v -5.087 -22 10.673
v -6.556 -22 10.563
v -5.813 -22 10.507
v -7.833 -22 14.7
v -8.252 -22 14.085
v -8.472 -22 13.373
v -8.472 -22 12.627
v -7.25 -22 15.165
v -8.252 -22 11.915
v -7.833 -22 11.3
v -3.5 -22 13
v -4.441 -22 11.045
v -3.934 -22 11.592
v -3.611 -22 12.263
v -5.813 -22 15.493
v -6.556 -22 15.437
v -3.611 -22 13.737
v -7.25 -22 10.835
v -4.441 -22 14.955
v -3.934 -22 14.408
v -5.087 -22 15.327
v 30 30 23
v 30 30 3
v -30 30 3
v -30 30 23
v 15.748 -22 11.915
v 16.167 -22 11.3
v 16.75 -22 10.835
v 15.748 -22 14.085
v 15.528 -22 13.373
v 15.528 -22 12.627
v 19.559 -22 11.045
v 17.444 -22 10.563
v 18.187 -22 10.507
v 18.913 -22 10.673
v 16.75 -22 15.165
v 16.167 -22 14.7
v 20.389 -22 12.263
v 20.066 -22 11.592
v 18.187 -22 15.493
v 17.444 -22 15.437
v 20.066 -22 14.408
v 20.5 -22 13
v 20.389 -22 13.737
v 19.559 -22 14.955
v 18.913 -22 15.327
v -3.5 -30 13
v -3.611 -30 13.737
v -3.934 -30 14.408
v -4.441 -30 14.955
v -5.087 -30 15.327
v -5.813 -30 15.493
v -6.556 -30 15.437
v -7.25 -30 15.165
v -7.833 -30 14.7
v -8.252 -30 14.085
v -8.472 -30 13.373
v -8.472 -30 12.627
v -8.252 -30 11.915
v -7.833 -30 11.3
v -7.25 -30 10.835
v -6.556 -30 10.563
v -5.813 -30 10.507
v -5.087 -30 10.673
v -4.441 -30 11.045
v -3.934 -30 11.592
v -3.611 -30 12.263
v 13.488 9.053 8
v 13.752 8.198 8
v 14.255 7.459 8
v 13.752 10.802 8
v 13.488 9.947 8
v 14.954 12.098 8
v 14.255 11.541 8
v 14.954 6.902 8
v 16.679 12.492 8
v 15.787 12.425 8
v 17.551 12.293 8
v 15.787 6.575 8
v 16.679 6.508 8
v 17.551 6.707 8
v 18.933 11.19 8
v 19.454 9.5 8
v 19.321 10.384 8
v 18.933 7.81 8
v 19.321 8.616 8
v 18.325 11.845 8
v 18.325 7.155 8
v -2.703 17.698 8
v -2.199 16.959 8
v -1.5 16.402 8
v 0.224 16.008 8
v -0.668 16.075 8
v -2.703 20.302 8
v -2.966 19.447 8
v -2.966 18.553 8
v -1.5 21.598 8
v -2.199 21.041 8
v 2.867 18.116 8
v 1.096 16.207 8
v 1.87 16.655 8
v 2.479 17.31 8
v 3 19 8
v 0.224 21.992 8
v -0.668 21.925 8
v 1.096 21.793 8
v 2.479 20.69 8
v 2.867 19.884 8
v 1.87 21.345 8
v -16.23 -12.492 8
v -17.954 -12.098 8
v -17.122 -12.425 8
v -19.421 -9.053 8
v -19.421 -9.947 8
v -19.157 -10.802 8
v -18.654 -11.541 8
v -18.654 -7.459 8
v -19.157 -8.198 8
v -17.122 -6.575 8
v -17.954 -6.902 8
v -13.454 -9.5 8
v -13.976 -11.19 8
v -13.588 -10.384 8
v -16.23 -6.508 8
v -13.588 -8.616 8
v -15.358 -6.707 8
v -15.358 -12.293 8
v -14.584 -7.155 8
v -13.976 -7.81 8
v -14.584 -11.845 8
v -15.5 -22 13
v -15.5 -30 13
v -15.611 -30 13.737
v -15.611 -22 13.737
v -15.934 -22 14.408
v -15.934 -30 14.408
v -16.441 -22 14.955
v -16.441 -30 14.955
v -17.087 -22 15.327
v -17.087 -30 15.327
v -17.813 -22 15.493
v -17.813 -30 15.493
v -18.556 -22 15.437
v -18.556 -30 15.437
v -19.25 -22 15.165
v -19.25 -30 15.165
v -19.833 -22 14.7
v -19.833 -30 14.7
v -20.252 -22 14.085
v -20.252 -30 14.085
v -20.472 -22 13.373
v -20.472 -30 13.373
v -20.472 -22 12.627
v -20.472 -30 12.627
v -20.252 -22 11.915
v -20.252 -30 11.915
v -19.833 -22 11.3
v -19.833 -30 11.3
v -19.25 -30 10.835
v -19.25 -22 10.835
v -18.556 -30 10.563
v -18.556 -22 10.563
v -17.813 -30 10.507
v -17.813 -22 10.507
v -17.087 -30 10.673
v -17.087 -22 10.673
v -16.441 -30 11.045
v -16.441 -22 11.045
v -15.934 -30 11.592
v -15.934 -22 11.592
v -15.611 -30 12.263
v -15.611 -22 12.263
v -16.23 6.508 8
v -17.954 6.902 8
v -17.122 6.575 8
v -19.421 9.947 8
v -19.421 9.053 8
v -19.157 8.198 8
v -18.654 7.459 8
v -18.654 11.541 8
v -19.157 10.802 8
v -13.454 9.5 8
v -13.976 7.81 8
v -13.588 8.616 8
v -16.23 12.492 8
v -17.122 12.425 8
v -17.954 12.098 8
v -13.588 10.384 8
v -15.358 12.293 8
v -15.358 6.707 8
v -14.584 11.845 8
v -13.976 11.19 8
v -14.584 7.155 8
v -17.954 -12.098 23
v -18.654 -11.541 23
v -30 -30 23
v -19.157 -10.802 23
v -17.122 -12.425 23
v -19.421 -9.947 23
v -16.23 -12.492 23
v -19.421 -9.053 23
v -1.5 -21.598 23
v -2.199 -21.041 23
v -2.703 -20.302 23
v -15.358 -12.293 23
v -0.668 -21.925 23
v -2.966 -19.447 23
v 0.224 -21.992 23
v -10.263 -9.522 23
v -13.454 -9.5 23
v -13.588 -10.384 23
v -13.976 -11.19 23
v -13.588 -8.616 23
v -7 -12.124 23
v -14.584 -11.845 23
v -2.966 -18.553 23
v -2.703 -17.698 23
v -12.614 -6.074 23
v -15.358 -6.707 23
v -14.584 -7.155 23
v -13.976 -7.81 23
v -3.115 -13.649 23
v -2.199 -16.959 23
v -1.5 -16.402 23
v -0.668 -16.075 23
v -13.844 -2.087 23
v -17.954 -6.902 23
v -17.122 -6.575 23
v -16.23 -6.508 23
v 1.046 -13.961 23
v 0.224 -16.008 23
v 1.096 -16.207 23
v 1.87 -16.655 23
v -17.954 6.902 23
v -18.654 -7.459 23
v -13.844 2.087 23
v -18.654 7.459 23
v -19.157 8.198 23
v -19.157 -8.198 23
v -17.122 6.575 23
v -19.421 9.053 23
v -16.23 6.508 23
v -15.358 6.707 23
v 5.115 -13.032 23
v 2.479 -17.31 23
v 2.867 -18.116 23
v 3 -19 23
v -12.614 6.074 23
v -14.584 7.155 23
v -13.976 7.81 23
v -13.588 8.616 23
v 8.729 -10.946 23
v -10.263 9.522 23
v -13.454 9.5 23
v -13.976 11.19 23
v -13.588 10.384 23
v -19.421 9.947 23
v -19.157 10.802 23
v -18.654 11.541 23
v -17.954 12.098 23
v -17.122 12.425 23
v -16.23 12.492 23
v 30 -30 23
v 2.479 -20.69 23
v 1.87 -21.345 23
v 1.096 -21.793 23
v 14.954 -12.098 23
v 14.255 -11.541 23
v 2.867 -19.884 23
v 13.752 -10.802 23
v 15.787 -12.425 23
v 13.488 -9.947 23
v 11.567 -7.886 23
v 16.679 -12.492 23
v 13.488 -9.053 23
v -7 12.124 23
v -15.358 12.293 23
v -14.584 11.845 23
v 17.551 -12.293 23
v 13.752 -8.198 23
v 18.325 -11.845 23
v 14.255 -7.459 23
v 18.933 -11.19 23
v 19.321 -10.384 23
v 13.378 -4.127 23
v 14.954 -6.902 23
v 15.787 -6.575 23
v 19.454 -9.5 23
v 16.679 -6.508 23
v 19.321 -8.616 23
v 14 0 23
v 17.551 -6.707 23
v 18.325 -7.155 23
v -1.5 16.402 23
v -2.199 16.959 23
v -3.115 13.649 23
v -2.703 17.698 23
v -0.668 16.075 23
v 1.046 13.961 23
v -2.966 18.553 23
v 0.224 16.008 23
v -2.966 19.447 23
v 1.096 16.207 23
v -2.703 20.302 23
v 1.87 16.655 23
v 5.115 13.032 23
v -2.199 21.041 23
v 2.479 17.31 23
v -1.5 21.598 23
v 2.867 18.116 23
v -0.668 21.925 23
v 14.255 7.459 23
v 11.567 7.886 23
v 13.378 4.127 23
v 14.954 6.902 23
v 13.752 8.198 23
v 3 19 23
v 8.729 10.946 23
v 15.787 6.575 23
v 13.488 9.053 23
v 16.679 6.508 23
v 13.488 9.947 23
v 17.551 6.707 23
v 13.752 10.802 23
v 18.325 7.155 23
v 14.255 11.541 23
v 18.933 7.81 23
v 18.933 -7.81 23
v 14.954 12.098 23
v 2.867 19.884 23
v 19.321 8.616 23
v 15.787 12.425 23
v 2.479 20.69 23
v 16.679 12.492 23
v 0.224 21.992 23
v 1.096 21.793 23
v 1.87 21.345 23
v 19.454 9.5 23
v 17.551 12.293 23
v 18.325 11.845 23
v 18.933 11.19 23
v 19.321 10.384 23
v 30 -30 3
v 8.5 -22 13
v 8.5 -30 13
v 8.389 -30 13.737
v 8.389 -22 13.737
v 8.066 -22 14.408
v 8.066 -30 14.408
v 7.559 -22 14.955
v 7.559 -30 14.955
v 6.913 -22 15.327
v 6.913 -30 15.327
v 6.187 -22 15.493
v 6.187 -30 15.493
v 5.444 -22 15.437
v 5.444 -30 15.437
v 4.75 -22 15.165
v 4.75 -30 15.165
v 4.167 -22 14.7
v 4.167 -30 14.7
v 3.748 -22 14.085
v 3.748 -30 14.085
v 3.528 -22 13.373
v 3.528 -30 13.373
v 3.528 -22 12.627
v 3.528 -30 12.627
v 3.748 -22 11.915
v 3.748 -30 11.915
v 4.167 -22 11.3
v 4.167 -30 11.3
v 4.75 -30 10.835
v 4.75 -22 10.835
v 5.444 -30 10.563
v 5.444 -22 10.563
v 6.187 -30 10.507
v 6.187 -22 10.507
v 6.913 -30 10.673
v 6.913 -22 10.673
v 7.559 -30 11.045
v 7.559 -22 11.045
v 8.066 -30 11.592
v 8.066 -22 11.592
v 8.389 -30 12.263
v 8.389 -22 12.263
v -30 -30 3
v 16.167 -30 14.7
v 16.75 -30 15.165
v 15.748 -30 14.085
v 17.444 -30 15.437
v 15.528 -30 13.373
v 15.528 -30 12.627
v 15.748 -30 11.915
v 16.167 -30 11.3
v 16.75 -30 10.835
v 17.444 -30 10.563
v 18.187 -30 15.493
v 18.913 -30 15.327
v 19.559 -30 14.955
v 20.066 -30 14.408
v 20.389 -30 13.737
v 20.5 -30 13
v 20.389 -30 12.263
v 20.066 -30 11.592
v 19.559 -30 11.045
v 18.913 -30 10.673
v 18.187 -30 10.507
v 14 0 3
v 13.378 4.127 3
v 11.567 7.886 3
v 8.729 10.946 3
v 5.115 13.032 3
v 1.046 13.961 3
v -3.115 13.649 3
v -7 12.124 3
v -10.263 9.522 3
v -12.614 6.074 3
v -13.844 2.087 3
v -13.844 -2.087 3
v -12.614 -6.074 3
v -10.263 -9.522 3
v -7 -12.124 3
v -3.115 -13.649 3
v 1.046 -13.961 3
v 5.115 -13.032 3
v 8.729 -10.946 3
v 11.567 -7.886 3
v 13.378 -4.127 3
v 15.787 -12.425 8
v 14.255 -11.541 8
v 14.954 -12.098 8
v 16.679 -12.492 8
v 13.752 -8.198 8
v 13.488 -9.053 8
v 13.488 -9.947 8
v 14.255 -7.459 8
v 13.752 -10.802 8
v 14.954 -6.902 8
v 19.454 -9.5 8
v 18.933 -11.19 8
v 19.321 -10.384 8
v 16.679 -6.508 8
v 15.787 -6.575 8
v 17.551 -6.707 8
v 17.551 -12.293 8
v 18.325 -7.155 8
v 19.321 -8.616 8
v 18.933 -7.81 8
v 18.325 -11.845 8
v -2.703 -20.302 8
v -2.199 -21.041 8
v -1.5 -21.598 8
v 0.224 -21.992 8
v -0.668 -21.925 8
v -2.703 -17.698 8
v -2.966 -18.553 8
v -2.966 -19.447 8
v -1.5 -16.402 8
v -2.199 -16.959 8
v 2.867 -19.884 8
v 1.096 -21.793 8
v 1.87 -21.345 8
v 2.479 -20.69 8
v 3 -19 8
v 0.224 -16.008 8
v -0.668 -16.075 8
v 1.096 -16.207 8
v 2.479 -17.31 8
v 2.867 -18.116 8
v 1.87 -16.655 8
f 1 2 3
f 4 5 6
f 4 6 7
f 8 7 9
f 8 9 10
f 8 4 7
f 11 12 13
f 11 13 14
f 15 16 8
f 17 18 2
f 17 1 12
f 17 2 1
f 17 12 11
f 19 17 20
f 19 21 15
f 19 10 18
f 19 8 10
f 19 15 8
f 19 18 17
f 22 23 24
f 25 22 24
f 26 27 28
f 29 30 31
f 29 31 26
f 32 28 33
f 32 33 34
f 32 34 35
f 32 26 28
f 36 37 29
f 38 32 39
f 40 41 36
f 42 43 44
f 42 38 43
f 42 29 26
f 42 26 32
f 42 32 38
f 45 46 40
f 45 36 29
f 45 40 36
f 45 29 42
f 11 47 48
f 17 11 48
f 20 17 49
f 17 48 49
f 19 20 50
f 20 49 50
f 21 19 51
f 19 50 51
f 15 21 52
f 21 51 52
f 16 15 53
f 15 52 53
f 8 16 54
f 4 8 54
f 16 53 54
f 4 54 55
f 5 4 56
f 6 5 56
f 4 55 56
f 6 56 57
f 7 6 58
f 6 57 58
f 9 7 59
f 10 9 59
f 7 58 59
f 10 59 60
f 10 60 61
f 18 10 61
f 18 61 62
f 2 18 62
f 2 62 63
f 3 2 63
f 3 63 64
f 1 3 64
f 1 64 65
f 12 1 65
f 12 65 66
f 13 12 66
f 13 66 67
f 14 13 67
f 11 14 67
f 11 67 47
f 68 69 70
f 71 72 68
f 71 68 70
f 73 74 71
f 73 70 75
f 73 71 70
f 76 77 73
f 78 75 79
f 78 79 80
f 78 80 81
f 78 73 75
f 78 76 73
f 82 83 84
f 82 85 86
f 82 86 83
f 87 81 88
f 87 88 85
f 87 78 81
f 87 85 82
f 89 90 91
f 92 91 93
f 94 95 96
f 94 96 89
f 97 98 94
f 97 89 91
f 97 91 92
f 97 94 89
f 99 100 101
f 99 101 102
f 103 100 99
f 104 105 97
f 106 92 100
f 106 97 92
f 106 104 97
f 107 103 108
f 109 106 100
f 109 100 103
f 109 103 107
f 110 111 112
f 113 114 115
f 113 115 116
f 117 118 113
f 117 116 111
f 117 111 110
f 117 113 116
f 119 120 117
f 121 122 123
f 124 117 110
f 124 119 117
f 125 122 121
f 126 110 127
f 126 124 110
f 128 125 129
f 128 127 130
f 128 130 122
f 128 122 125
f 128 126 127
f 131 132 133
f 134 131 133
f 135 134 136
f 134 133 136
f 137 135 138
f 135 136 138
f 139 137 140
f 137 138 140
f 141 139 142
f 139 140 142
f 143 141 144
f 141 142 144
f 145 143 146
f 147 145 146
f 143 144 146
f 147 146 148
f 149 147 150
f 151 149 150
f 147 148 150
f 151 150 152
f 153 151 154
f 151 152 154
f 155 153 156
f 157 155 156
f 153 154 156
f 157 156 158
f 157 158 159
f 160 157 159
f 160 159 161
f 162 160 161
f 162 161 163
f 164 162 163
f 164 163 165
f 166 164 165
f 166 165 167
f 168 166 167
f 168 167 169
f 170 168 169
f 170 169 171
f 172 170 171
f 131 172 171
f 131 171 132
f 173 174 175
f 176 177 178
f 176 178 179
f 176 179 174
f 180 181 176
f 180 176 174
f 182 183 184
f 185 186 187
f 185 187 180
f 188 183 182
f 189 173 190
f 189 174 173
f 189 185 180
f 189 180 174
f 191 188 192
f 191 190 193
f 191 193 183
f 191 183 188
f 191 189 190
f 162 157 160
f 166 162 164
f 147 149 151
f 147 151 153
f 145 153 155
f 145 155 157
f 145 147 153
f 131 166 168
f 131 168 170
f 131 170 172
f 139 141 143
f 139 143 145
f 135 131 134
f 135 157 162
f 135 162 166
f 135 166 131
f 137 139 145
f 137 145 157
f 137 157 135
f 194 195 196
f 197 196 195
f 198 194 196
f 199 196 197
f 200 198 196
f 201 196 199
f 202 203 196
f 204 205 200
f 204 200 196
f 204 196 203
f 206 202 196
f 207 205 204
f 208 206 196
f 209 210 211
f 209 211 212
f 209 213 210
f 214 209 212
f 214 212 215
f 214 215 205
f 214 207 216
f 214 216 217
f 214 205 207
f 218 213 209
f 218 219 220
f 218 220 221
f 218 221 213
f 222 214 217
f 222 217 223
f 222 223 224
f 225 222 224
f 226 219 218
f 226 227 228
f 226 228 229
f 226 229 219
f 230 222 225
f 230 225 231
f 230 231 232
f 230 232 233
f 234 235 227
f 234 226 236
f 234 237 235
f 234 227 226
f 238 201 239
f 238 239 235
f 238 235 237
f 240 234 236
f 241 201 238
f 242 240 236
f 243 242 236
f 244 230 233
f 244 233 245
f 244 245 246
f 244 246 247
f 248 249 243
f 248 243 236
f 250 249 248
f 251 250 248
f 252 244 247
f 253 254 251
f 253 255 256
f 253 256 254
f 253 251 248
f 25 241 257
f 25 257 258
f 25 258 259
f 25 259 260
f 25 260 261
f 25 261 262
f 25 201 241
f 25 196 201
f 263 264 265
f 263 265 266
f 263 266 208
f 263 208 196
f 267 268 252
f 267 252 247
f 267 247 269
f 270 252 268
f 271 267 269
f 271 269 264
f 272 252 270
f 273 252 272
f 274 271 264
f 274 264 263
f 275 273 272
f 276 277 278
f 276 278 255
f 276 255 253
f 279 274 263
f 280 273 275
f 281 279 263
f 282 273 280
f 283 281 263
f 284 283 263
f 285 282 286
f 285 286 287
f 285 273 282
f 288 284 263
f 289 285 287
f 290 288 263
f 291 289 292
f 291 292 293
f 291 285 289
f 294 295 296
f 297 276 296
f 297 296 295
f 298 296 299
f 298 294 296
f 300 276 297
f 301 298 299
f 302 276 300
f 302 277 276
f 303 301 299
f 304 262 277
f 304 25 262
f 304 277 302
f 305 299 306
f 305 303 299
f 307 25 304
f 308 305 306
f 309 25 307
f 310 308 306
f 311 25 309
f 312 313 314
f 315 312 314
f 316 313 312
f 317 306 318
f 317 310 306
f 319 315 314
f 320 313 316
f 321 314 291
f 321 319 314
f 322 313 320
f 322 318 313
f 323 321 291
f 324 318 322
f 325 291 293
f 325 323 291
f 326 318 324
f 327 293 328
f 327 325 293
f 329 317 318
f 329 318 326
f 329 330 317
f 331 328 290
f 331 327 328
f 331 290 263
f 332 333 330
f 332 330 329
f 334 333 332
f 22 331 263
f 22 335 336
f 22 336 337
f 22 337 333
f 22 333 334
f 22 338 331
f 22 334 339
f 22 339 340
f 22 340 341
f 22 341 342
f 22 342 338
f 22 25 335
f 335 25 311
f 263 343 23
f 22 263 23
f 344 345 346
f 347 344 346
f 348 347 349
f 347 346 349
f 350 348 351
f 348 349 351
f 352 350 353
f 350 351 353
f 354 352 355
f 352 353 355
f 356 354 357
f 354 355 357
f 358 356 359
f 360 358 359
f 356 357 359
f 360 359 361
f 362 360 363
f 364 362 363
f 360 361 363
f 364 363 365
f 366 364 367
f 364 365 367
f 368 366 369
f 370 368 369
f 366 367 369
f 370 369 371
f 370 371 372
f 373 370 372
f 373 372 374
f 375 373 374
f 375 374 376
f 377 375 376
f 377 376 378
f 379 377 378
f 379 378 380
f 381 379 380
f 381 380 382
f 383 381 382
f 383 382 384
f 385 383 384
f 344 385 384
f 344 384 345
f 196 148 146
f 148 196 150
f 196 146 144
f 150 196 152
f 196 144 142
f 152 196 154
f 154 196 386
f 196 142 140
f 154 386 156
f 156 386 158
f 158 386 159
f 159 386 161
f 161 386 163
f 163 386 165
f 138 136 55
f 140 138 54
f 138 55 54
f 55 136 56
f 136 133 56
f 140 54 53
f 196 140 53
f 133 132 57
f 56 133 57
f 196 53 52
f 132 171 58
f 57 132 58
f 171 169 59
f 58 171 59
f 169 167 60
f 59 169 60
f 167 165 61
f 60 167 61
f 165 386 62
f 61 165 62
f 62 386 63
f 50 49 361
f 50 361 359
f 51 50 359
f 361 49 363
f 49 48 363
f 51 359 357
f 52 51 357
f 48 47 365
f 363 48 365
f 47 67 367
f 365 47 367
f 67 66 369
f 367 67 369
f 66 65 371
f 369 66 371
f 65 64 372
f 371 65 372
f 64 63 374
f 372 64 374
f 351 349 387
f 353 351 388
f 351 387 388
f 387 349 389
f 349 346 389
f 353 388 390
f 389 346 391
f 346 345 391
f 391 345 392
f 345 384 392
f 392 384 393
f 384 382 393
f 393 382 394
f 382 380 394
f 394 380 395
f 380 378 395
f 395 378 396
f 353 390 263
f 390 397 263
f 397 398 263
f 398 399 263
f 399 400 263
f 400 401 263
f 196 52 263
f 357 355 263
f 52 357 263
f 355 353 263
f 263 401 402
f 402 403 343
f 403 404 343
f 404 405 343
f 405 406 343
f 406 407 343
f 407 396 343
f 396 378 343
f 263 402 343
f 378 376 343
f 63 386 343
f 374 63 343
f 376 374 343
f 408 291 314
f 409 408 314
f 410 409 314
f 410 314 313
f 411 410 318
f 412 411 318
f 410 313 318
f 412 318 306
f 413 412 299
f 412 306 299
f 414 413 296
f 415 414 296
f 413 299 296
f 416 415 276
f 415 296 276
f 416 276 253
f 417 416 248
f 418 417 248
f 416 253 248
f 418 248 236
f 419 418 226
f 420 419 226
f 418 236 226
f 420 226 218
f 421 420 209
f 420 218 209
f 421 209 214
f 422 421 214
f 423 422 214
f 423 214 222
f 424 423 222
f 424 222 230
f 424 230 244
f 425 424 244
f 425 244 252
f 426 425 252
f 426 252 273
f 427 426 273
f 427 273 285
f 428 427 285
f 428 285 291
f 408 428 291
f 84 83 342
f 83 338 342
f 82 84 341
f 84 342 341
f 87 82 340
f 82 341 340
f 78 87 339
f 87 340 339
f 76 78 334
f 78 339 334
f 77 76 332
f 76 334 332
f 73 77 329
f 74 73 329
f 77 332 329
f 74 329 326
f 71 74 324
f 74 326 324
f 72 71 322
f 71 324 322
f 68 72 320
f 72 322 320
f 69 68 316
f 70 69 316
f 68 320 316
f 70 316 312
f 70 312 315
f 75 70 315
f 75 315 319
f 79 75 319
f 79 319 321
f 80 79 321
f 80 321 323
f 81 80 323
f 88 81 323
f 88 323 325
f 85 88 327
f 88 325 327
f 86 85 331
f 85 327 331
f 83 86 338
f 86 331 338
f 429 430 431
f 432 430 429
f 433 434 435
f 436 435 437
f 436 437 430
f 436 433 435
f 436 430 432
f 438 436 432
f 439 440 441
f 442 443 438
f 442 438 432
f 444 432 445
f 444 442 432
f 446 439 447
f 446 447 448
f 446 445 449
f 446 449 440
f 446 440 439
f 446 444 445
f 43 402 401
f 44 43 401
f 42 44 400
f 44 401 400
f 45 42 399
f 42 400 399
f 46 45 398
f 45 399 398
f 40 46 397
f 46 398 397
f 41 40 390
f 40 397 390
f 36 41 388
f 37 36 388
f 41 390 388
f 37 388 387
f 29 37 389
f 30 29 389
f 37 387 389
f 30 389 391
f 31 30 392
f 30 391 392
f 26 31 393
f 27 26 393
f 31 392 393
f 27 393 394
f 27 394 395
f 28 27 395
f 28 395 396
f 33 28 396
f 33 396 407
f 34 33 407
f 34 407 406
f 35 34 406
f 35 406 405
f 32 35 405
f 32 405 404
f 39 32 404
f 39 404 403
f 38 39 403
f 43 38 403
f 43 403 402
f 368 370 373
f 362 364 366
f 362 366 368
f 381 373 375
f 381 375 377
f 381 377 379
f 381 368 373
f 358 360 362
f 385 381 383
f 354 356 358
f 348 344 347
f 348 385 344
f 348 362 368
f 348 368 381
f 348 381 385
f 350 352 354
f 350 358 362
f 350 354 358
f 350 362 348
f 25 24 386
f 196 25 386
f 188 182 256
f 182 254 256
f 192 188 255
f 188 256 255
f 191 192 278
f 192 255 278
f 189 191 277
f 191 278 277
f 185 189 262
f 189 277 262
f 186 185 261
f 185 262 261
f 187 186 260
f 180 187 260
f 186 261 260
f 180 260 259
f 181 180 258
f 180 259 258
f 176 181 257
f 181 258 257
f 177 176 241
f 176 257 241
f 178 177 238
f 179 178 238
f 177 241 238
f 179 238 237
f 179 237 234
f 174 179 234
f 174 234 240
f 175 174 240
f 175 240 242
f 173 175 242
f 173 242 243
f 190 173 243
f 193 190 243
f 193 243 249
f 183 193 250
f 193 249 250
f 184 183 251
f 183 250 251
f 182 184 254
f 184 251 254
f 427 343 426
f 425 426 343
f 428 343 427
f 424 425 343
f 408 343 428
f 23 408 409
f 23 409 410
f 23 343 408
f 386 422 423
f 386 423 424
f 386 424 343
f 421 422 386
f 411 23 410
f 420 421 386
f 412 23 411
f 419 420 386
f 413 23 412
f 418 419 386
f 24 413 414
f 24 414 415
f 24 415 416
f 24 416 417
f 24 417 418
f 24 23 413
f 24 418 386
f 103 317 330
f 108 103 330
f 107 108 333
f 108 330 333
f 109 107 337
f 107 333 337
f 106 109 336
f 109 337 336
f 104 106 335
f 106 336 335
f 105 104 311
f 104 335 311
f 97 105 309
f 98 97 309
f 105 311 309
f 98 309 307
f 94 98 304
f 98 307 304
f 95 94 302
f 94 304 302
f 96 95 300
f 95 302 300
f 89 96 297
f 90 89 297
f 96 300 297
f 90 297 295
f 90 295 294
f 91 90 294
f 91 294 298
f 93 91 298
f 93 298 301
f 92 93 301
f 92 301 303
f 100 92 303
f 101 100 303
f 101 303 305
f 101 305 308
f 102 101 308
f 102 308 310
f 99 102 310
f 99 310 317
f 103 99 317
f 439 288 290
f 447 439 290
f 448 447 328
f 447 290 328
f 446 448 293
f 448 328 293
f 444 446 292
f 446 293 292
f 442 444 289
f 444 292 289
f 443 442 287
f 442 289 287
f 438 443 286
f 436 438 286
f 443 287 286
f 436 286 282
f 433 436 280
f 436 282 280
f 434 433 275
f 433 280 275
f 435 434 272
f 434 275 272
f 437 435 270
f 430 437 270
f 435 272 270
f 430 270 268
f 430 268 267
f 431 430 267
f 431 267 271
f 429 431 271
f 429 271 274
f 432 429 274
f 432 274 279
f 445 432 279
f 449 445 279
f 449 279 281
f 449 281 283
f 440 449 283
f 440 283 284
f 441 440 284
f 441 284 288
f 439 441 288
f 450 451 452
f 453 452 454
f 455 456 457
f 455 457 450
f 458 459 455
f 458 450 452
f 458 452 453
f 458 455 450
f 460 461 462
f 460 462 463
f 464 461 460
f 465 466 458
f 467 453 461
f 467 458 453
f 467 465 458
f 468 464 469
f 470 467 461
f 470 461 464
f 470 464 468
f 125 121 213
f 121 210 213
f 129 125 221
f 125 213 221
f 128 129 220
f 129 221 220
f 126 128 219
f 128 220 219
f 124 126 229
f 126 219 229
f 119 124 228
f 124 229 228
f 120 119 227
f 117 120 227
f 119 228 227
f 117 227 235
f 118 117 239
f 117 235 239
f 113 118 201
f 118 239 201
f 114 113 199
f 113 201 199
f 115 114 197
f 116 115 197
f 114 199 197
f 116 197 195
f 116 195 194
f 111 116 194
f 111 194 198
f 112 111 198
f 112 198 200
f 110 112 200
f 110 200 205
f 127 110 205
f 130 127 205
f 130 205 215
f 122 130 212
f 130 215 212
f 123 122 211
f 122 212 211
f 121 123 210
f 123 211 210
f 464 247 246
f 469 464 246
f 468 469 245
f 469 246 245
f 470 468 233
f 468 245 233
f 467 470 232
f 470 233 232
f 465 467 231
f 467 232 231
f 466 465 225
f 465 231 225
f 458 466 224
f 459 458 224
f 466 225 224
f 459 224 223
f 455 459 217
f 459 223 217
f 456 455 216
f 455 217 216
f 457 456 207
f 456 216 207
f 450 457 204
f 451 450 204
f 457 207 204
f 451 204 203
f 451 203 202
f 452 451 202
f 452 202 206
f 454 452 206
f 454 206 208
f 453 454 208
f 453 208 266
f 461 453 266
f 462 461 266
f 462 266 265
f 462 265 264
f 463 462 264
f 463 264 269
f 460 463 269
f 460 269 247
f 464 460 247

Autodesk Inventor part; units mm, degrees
ref_plane "YZ Plane" through (0, 0, 0) normal (1, 0, 0) x (0, 1, 0)
ref_plane "XZ Plane" through (0, 0, 0) normal (0, 1, 0) x (-1, 0, 0)
ref_plane "XY Plane" through (0, 0, 0) normal (0, 0, 1) x (1, 0, 0)
sketch "Szkic1" plane through (0, 0, 0) normal (0, 0, 1) x (1, 0, 0)
  line L0 (-30, -30) -> (30, -30)
  line L1 (30, -30) -> (30, 30)
  line L2 (30, 30) -> (-30, 30)
  line L3 (-30, 30) -> (-30, -30)
  line L4 (-30, -30) -> (30, 30) construction
  line L5 (30, -30) -> (-30, 30) construction
  point P0 (0, 0)
  dimension "d0" = 60
  dimension "d1" = 60
extrude "Wyciągnięcie proste1" add sketch "Szkic1" along normal blind 35
sketch "Szkic2" plane through (0, 0, 35) normal (0, 0, 1) x (1, 0, 0)
  circle A0 centre (0, 0) radius 25
  dimension "d4" = 50
extrude "Wyciągnięcie proste2" cut sketch "Szkic2" against normal blind 12
sketch "Szkic3" plane through (0, 0, 23) normal (0, 0, 1) x (1, 0, 0)
  circle A0 centre (0, 0) radius 14
  dimension "d7" = 28
extrude "Wyciągnięcie proste3" cut sketch "Szkic3" against normal up to next
sketch "Szkic4" plane through (0, 0, 23) normal (0, 0, 1) x (1, 0, 0)
  circle A0 centre (0, 0) radius 19
  circle A1 centre (0, 19) radius 3
  circle A2 centre (-16.4545, 9.5) radius 3
  circle A3 centre (-16.4545, -9.5) radius 3
  circle A4 centre (0, -19) radius 3
  circle A5 centre (16.4545, -9.5) radius 3
  circle A6 centre (16.4545, 9.5) radius 3
  dimension "d10" = 38
  dimension "d11" = 6
  dimension "d14" = 360
sketch "Szkic13" plane through (0, 0, 35) normal (0, 0, 1) x (1, 0, 0)
  circle A0 centre (0, 0) radius 25 projected
  line L0 (-30, -30) -> (30, -30) projected
  line L1 (30, -30) -> (30, 30) projected
  line L2 (30, 30) -> (-30, 30) projected
  line L3 (-30, 30) -> (-30, -30) projected
extrude "Wyciągnięcie proste10" cut sketch "Szkic13" against normal up to surface (12 mm away)
extrude "Wyciągnięcie proste11" cut sketch "Szkic4" against normal blind 15 contours A6 A0 | A0 A6 | A5 A0 | A0 A5 | A1 A0 | A0 A1 | A4 A0 | A0 A4 | A2 A0 | A0 A2 | A3 A0 | A0 A3
thread "Gwint7" size "M6x1" class "6H" standard "ANSI Metric M Profile" full length
thread "Gwint8" size "M6x1" class "6H" standard "ANSI Metric M Profile" full length
thread "Gwint9" size "M6x1" class "6H" standard "ANSI Metric M Profile" full length
thread "Gwint10" size "M6x1" class "6H" standard "ANSI Metric M Profile" full length
thread "Gwint11" size "M6x1" class "6H" standard "ANSI Metric M Profile" full length
thread "Gwint12" size "M6x1" class "6H" standard "ANSI Metric M Profile" full length
sketch "Szkic14" plane through (0, 0, 0) normal (0, 0, -1) x (-1, 0, 0)
  circle A0 centre (0, 0) radius 14 projected
  line L0 (30, -30) -> (-30, -30) projected
  line L1 (30, 30) -> (30, -30) projected
  line L2 (-30, 30) -> (30, 30) projected
  line L3 (-30, -30) -> (-30, 30) projected
extrude "Wyciągnięcie proste12" cut sketch "Szkic14" against normal blind 3
sketch "Szkic15" plane through (-30, -30, 23) normal (0, -1, 0) x (1, 0, 0)
  line L0 (0, -20) -> (60, -20) projected
  line L1 (60, -20) -> (60, 0) projected
  line L2 (60, 0) -> (0, 0) projected
  line L3 (0, -20) -> (0, 0) projected
  line L4 (0, 0) -> (60, 0) projected
  line L5 (0, 0) -> (0, -10)
  line L6 (0, -10) -> (60, -10)
  line L7 (60, -20) -> (60, 0) projected
  line L8 (0, -10) -> (12, -10)
  line L9 (12, -10) -> (24, -10)
  line L10 (24, -10) -> (36, -10)
  line L11 (36, -10) -> (48, -10)
  circle A0 centre (12, -10) radius 2.5
  circle A1 centre (24, -10) radius 2.5
  circle A2 centre (36, -10) radius 2.5
  circle A3 centre (48, -10) radius 2.5
  point P0 (30, -23)
  dimension "d79" = 10
  dimension "d80" = 12
  dimension "d81" = 12
  dimension "d82" = 12
  dimension "d83" = 12
  dimension "d84" = 5
  dimension "d85" = 5
  dimension "d86" = 5
  dimension "d87" = 5
extrude "Wyciągnięcie proste13" cut sketch "Szkic15" against normal blind 8 contours A0 L6 | L6 A0 | A3 L6 | L6 A3 | A1 L6 | L6 A1 | A2 L6 | L6 A2
thread "Gwint13" size "M5x0.8" class "6H" standard "ANSI Metric M Profile" full length
thread "Gwint14" size "M5x0.8" class "6H" standard "ANSI Metric M Profile" full length
thread "Gwint15" size "M5x0.8" class "6H" standard "ANSI Metric M Profile" full length
thread "Gwint16" size "M5x0.8" class "6H" standard "ANSI Metric M Profile" full length
properties part number "Obudowa nakrętki trapezowej fi 16"
